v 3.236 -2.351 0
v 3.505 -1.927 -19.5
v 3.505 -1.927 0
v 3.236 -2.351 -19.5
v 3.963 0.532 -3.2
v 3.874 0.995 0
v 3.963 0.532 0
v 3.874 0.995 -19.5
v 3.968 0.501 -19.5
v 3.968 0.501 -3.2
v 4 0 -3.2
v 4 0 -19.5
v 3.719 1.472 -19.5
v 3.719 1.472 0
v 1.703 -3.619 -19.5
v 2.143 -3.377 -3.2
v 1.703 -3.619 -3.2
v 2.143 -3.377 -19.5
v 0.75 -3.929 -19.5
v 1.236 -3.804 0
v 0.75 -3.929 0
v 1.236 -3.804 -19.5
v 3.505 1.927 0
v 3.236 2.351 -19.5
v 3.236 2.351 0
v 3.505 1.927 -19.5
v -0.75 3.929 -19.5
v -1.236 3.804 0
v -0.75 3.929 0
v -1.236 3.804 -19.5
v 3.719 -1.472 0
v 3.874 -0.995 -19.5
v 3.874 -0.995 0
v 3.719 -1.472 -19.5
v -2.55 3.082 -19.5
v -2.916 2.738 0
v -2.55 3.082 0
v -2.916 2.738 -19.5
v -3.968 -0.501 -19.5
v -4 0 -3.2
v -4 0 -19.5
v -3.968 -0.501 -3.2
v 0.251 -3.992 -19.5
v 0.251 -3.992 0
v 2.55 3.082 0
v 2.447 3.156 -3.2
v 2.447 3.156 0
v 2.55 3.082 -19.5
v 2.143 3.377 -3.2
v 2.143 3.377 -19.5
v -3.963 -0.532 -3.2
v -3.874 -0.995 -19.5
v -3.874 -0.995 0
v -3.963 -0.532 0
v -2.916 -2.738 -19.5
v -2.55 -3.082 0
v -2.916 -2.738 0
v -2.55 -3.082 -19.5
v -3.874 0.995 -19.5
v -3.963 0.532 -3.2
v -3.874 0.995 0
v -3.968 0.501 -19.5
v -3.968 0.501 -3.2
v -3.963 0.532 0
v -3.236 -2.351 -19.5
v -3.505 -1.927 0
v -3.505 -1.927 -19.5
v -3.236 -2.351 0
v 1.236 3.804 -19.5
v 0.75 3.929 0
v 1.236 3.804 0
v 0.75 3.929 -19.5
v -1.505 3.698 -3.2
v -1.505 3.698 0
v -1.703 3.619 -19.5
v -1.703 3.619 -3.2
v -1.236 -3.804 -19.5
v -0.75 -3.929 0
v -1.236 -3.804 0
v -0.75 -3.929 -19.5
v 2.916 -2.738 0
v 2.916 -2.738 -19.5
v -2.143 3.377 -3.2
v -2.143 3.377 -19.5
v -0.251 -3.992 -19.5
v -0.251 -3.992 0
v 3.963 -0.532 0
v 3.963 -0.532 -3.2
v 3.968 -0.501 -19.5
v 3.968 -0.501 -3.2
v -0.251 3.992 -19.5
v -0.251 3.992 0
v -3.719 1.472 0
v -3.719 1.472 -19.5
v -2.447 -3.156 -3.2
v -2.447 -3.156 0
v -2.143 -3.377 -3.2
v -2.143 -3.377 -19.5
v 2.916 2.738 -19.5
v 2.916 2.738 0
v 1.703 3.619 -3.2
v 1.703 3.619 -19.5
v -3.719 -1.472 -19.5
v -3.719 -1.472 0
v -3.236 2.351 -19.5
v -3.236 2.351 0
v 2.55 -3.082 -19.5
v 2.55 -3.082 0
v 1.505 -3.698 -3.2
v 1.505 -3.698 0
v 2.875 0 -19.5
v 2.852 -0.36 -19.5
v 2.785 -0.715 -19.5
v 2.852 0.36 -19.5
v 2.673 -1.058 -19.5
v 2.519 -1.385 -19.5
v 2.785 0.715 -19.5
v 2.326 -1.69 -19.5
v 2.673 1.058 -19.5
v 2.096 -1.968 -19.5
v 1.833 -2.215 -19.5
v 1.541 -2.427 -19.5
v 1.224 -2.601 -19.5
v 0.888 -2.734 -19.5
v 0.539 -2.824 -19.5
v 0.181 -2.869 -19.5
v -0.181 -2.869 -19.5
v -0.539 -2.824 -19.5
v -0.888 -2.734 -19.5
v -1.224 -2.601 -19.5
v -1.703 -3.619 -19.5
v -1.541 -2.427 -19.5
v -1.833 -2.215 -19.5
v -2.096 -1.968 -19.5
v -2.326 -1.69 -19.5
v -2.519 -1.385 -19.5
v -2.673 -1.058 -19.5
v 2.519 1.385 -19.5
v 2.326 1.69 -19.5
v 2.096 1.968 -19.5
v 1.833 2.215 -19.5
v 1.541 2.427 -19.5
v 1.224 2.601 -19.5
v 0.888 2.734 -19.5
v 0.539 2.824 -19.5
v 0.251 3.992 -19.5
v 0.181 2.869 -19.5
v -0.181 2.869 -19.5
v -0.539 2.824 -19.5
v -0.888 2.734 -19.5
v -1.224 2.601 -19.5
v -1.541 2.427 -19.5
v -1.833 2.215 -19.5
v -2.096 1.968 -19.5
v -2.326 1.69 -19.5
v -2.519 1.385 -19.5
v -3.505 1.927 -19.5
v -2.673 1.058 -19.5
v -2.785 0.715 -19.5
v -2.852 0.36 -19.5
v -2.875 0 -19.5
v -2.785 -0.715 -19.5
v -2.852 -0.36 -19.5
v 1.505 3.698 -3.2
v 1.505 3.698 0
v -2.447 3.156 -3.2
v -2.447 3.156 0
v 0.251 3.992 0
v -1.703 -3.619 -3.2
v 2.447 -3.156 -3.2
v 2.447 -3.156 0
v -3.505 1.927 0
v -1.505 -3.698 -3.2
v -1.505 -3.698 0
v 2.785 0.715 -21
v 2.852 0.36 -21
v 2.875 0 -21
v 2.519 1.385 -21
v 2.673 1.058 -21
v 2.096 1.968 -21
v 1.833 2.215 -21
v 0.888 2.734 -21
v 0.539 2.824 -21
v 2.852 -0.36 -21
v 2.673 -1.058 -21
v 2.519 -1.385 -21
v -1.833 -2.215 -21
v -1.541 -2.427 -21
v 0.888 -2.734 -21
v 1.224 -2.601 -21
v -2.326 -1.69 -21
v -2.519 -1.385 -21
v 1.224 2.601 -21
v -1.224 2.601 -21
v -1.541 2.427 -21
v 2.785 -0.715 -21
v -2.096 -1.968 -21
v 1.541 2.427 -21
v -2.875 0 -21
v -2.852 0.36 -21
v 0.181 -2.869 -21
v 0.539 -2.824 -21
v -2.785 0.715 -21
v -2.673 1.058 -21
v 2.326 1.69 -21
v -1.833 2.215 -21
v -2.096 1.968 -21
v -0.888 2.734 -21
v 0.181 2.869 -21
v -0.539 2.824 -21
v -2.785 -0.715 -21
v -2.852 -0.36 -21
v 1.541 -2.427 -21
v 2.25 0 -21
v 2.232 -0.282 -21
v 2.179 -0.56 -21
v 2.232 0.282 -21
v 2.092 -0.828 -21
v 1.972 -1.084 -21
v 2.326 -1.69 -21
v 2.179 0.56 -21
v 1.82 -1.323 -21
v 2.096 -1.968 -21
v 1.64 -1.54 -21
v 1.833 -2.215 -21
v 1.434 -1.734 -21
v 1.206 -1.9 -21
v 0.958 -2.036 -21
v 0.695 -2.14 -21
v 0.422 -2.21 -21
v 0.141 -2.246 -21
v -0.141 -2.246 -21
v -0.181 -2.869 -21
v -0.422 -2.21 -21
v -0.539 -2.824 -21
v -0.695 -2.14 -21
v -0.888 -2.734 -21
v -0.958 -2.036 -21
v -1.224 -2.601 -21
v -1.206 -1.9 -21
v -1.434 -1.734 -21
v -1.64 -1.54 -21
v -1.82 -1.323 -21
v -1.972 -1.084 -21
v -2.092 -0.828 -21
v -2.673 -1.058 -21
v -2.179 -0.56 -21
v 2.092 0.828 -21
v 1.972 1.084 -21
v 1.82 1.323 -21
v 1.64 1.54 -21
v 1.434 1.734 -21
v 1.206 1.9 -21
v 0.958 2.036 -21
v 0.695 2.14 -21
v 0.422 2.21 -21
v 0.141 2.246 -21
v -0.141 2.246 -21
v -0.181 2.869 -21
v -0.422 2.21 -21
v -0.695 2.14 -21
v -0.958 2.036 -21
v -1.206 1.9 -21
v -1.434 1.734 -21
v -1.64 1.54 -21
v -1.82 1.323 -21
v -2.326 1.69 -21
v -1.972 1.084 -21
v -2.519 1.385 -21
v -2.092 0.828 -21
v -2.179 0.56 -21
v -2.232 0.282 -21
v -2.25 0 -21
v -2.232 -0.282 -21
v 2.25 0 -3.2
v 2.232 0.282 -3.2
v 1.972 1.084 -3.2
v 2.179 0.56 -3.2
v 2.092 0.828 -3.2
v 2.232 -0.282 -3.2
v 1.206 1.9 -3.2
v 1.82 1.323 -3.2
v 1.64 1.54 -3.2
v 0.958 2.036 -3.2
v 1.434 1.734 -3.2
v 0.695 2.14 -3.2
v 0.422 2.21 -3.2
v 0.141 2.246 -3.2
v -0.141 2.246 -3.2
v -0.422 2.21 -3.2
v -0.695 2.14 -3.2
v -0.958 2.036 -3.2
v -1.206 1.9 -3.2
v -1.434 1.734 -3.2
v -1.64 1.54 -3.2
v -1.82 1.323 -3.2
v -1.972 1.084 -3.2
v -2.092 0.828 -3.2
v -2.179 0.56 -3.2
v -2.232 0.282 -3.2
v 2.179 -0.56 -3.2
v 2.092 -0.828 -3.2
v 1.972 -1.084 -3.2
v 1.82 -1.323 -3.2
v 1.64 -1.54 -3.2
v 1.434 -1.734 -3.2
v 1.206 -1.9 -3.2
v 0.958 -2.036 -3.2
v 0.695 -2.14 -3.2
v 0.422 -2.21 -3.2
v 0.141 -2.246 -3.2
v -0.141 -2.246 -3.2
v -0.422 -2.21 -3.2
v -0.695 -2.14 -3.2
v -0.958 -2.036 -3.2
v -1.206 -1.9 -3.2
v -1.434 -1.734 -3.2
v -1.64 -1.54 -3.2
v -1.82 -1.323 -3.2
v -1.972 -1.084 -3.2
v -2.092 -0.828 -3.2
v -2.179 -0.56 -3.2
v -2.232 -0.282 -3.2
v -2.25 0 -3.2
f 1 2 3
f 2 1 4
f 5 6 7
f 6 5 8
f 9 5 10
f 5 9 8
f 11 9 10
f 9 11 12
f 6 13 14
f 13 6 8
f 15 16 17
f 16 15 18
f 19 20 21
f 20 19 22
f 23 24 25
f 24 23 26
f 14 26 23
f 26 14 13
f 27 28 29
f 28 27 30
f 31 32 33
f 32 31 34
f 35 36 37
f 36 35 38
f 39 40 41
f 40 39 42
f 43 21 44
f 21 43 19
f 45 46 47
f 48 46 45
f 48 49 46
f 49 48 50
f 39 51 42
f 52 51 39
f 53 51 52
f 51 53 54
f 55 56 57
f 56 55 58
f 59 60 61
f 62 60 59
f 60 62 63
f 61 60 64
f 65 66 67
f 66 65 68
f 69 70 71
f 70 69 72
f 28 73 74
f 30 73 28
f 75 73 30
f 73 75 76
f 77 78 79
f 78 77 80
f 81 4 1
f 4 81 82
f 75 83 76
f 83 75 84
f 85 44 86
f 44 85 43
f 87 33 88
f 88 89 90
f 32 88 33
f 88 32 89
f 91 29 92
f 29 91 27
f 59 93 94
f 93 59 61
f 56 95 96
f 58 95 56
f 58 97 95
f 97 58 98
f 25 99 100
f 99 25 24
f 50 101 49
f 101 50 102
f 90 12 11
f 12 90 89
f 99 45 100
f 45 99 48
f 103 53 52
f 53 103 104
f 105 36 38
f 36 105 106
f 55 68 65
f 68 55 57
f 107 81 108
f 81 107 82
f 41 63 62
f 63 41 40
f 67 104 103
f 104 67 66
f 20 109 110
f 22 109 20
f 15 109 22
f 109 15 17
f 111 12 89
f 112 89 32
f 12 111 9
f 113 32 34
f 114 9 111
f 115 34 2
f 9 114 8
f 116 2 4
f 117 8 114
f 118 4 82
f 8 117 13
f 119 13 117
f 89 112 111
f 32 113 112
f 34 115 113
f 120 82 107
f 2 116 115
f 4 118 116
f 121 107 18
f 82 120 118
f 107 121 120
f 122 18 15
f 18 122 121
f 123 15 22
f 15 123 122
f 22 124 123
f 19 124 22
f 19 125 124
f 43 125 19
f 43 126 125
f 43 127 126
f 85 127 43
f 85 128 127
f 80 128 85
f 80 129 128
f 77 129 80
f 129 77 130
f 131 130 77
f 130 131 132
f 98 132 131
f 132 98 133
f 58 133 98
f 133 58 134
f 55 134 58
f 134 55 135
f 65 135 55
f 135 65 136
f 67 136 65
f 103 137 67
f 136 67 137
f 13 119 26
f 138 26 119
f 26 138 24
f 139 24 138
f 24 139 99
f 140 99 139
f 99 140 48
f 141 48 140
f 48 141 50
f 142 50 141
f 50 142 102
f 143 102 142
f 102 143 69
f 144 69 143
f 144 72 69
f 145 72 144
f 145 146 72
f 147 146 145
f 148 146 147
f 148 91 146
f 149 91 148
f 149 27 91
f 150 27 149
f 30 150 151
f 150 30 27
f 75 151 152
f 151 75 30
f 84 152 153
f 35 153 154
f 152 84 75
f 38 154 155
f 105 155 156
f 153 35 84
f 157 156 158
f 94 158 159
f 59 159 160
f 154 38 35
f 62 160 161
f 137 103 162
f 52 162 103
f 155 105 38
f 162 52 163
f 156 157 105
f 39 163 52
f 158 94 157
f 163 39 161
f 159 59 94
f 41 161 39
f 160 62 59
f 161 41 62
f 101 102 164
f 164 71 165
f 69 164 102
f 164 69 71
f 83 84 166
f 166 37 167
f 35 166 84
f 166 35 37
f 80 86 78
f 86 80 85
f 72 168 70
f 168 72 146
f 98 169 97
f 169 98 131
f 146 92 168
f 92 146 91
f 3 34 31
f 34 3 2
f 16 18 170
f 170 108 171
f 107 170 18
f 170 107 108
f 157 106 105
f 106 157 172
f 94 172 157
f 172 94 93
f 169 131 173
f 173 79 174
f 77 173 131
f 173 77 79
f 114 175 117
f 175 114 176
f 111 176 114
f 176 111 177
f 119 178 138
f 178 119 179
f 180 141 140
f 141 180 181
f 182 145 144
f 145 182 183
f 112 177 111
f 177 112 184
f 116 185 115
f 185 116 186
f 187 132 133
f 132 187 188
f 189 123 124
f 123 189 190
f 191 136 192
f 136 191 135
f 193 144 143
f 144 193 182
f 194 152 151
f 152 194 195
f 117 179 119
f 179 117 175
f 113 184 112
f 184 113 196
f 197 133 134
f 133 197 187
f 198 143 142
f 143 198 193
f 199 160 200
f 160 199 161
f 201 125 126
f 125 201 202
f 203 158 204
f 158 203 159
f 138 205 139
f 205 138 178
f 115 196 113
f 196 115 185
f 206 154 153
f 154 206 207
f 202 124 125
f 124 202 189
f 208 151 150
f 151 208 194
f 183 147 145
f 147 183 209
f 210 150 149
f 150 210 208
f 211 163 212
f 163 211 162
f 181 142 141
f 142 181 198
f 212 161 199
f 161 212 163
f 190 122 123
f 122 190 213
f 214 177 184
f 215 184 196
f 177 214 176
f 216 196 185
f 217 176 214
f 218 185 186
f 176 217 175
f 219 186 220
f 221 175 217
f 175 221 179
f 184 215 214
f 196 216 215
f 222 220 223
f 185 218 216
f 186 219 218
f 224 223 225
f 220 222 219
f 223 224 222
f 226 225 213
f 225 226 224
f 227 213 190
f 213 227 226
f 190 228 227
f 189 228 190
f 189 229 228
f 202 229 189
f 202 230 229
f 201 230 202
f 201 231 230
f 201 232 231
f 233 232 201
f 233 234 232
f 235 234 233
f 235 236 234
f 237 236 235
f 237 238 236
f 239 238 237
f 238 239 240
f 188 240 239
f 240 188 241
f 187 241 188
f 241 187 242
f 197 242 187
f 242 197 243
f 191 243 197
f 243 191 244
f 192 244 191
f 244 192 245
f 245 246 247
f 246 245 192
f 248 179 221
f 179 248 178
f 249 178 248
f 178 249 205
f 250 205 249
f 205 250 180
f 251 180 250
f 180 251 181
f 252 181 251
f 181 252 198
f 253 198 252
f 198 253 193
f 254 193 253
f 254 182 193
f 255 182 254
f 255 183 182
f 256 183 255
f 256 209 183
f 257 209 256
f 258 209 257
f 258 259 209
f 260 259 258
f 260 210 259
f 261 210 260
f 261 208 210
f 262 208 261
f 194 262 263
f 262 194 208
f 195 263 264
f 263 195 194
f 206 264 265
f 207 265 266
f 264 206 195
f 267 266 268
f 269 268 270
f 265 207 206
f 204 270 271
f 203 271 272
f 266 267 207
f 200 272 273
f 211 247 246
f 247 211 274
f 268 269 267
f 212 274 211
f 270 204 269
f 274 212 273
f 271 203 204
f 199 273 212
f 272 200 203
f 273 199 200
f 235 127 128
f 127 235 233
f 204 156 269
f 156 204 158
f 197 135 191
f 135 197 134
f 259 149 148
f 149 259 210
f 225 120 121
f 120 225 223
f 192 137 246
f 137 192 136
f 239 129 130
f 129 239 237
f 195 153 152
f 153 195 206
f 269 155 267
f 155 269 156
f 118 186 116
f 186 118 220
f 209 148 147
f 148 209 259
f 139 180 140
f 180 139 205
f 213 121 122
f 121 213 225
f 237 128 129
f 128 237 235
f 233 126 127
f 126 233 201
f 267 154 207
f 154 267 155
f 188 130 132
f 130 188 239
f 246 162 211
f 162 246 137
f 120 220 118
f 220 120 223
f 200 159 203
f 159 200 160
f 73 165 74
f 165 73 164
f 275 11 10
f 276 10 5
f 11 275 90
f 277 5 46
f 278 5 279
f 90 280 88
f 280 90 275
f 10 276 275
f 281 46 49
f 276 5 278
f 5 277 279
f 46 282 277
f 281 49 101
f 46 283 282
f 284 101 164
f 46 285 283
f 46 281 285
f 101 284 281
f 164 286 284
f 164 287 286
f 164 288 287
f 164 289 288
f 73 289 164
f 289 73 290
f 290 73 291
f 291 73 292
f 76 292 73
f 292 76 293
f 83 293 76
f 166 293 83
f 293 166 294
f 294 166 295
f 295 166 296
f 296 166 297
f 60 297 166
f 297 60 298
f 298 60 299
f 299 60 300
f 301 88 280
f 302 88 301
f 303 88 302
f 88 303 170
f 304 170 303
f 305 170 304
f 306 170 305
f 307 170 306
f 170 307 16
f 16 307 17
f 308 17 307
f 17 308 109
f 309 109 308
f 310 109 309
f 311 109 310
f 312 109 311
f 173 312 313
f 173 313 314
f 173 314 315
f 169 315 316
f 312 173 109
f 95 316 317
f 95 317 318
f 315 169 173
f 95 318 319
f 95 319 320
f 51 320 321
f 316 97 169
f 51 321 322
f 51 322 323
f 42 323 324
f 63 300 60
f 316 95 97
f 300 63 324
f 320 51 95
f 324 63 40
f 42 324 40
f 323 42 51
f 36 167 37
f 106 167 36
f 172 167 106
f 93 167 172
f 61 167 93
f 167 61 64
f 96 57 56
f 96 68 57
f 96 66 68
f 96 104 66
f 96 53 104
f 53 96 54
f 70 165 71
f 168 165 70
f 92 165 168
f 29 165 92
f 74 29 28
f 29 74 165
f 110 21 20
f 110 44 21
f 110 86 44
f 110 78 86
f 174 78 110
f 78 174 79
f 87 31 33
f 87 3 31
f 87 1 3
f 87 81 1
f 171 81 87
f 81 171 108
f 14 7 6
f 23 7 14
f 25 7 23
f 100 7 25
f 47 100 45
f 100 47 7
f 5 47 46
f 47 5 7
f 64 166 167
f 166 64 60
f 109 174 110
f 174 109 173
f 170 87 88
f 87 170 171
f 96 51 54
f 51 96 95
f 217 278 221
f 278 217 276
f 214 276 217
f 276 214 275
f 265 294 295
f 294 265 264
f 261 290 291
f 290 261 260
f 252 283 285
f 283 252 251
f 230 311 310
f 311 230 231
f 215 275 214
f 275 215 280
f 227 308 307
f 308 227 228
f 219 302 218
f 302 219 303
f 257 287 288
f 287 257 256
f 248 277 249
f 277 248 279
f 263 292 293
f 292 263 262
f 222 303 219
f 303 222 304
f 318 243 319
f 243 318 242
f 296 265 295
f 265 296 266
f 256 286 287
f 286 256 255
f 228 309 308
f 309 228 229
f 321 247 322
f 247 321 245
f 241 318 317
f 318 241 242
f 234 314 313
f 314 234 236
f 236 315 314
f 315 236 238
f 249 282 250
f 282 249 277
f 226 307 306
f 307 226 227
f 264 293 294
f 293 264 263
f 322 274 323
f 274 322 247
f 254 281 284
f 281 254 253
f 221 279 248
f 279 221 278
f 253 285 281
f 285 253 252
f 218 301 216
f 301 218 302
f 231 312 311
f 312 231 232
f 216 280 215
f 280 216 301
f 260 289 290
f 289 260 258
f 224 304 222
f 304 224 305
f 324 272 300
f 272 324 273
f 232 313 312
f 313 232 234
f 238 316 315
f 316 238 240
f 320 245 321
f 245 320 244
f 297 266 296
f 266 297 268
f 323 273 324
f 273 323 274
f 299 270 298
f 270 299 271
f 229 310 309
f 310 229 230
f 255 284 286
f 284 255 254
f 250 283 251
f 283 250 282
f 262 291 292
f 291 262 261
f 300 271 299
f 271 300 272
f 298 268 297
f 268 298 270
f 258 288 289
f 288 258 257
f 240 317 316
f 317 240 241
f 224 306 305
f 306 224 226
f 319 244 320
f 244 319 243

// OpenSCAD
$fn = 50;

difference() {
	union() {
		translate(v = [0, 0, -19.5]) {
			cylinder(h = 22.5, r = 4.0);
		}
		#translate(v = [0, 0, -21.0]) {
			cylinder(h = 21, r = 2.875);
		}
	}
	union() {
		translate(v = [0, 0, 0]) {
			rotate(a = [0, 0, 0]) {
				difference() {
					union() {
						translate(v = [0, 0, -3.2]) {
							linear_extrude(height = 3.2) {
								polygon(points = [[4.2698, 0.0], [2.1349000000000005, 3.697755269078796], [-2.134899999999999, 3.6977552690787965], [-4.2698, 5.228996902999369e-16], [-2.134900000000002, -3.6977552690787956], [2.1348999999999974, -3.697755269078798]]);
							}
						}
					}
					union();
				}
			}
		}
		#cylinder(h = 3, r = 5.0);
		#translate(v = [0, 0, -100.0]) {
			cylinder(h = 200, r = 2.25);
		}
	}
}
